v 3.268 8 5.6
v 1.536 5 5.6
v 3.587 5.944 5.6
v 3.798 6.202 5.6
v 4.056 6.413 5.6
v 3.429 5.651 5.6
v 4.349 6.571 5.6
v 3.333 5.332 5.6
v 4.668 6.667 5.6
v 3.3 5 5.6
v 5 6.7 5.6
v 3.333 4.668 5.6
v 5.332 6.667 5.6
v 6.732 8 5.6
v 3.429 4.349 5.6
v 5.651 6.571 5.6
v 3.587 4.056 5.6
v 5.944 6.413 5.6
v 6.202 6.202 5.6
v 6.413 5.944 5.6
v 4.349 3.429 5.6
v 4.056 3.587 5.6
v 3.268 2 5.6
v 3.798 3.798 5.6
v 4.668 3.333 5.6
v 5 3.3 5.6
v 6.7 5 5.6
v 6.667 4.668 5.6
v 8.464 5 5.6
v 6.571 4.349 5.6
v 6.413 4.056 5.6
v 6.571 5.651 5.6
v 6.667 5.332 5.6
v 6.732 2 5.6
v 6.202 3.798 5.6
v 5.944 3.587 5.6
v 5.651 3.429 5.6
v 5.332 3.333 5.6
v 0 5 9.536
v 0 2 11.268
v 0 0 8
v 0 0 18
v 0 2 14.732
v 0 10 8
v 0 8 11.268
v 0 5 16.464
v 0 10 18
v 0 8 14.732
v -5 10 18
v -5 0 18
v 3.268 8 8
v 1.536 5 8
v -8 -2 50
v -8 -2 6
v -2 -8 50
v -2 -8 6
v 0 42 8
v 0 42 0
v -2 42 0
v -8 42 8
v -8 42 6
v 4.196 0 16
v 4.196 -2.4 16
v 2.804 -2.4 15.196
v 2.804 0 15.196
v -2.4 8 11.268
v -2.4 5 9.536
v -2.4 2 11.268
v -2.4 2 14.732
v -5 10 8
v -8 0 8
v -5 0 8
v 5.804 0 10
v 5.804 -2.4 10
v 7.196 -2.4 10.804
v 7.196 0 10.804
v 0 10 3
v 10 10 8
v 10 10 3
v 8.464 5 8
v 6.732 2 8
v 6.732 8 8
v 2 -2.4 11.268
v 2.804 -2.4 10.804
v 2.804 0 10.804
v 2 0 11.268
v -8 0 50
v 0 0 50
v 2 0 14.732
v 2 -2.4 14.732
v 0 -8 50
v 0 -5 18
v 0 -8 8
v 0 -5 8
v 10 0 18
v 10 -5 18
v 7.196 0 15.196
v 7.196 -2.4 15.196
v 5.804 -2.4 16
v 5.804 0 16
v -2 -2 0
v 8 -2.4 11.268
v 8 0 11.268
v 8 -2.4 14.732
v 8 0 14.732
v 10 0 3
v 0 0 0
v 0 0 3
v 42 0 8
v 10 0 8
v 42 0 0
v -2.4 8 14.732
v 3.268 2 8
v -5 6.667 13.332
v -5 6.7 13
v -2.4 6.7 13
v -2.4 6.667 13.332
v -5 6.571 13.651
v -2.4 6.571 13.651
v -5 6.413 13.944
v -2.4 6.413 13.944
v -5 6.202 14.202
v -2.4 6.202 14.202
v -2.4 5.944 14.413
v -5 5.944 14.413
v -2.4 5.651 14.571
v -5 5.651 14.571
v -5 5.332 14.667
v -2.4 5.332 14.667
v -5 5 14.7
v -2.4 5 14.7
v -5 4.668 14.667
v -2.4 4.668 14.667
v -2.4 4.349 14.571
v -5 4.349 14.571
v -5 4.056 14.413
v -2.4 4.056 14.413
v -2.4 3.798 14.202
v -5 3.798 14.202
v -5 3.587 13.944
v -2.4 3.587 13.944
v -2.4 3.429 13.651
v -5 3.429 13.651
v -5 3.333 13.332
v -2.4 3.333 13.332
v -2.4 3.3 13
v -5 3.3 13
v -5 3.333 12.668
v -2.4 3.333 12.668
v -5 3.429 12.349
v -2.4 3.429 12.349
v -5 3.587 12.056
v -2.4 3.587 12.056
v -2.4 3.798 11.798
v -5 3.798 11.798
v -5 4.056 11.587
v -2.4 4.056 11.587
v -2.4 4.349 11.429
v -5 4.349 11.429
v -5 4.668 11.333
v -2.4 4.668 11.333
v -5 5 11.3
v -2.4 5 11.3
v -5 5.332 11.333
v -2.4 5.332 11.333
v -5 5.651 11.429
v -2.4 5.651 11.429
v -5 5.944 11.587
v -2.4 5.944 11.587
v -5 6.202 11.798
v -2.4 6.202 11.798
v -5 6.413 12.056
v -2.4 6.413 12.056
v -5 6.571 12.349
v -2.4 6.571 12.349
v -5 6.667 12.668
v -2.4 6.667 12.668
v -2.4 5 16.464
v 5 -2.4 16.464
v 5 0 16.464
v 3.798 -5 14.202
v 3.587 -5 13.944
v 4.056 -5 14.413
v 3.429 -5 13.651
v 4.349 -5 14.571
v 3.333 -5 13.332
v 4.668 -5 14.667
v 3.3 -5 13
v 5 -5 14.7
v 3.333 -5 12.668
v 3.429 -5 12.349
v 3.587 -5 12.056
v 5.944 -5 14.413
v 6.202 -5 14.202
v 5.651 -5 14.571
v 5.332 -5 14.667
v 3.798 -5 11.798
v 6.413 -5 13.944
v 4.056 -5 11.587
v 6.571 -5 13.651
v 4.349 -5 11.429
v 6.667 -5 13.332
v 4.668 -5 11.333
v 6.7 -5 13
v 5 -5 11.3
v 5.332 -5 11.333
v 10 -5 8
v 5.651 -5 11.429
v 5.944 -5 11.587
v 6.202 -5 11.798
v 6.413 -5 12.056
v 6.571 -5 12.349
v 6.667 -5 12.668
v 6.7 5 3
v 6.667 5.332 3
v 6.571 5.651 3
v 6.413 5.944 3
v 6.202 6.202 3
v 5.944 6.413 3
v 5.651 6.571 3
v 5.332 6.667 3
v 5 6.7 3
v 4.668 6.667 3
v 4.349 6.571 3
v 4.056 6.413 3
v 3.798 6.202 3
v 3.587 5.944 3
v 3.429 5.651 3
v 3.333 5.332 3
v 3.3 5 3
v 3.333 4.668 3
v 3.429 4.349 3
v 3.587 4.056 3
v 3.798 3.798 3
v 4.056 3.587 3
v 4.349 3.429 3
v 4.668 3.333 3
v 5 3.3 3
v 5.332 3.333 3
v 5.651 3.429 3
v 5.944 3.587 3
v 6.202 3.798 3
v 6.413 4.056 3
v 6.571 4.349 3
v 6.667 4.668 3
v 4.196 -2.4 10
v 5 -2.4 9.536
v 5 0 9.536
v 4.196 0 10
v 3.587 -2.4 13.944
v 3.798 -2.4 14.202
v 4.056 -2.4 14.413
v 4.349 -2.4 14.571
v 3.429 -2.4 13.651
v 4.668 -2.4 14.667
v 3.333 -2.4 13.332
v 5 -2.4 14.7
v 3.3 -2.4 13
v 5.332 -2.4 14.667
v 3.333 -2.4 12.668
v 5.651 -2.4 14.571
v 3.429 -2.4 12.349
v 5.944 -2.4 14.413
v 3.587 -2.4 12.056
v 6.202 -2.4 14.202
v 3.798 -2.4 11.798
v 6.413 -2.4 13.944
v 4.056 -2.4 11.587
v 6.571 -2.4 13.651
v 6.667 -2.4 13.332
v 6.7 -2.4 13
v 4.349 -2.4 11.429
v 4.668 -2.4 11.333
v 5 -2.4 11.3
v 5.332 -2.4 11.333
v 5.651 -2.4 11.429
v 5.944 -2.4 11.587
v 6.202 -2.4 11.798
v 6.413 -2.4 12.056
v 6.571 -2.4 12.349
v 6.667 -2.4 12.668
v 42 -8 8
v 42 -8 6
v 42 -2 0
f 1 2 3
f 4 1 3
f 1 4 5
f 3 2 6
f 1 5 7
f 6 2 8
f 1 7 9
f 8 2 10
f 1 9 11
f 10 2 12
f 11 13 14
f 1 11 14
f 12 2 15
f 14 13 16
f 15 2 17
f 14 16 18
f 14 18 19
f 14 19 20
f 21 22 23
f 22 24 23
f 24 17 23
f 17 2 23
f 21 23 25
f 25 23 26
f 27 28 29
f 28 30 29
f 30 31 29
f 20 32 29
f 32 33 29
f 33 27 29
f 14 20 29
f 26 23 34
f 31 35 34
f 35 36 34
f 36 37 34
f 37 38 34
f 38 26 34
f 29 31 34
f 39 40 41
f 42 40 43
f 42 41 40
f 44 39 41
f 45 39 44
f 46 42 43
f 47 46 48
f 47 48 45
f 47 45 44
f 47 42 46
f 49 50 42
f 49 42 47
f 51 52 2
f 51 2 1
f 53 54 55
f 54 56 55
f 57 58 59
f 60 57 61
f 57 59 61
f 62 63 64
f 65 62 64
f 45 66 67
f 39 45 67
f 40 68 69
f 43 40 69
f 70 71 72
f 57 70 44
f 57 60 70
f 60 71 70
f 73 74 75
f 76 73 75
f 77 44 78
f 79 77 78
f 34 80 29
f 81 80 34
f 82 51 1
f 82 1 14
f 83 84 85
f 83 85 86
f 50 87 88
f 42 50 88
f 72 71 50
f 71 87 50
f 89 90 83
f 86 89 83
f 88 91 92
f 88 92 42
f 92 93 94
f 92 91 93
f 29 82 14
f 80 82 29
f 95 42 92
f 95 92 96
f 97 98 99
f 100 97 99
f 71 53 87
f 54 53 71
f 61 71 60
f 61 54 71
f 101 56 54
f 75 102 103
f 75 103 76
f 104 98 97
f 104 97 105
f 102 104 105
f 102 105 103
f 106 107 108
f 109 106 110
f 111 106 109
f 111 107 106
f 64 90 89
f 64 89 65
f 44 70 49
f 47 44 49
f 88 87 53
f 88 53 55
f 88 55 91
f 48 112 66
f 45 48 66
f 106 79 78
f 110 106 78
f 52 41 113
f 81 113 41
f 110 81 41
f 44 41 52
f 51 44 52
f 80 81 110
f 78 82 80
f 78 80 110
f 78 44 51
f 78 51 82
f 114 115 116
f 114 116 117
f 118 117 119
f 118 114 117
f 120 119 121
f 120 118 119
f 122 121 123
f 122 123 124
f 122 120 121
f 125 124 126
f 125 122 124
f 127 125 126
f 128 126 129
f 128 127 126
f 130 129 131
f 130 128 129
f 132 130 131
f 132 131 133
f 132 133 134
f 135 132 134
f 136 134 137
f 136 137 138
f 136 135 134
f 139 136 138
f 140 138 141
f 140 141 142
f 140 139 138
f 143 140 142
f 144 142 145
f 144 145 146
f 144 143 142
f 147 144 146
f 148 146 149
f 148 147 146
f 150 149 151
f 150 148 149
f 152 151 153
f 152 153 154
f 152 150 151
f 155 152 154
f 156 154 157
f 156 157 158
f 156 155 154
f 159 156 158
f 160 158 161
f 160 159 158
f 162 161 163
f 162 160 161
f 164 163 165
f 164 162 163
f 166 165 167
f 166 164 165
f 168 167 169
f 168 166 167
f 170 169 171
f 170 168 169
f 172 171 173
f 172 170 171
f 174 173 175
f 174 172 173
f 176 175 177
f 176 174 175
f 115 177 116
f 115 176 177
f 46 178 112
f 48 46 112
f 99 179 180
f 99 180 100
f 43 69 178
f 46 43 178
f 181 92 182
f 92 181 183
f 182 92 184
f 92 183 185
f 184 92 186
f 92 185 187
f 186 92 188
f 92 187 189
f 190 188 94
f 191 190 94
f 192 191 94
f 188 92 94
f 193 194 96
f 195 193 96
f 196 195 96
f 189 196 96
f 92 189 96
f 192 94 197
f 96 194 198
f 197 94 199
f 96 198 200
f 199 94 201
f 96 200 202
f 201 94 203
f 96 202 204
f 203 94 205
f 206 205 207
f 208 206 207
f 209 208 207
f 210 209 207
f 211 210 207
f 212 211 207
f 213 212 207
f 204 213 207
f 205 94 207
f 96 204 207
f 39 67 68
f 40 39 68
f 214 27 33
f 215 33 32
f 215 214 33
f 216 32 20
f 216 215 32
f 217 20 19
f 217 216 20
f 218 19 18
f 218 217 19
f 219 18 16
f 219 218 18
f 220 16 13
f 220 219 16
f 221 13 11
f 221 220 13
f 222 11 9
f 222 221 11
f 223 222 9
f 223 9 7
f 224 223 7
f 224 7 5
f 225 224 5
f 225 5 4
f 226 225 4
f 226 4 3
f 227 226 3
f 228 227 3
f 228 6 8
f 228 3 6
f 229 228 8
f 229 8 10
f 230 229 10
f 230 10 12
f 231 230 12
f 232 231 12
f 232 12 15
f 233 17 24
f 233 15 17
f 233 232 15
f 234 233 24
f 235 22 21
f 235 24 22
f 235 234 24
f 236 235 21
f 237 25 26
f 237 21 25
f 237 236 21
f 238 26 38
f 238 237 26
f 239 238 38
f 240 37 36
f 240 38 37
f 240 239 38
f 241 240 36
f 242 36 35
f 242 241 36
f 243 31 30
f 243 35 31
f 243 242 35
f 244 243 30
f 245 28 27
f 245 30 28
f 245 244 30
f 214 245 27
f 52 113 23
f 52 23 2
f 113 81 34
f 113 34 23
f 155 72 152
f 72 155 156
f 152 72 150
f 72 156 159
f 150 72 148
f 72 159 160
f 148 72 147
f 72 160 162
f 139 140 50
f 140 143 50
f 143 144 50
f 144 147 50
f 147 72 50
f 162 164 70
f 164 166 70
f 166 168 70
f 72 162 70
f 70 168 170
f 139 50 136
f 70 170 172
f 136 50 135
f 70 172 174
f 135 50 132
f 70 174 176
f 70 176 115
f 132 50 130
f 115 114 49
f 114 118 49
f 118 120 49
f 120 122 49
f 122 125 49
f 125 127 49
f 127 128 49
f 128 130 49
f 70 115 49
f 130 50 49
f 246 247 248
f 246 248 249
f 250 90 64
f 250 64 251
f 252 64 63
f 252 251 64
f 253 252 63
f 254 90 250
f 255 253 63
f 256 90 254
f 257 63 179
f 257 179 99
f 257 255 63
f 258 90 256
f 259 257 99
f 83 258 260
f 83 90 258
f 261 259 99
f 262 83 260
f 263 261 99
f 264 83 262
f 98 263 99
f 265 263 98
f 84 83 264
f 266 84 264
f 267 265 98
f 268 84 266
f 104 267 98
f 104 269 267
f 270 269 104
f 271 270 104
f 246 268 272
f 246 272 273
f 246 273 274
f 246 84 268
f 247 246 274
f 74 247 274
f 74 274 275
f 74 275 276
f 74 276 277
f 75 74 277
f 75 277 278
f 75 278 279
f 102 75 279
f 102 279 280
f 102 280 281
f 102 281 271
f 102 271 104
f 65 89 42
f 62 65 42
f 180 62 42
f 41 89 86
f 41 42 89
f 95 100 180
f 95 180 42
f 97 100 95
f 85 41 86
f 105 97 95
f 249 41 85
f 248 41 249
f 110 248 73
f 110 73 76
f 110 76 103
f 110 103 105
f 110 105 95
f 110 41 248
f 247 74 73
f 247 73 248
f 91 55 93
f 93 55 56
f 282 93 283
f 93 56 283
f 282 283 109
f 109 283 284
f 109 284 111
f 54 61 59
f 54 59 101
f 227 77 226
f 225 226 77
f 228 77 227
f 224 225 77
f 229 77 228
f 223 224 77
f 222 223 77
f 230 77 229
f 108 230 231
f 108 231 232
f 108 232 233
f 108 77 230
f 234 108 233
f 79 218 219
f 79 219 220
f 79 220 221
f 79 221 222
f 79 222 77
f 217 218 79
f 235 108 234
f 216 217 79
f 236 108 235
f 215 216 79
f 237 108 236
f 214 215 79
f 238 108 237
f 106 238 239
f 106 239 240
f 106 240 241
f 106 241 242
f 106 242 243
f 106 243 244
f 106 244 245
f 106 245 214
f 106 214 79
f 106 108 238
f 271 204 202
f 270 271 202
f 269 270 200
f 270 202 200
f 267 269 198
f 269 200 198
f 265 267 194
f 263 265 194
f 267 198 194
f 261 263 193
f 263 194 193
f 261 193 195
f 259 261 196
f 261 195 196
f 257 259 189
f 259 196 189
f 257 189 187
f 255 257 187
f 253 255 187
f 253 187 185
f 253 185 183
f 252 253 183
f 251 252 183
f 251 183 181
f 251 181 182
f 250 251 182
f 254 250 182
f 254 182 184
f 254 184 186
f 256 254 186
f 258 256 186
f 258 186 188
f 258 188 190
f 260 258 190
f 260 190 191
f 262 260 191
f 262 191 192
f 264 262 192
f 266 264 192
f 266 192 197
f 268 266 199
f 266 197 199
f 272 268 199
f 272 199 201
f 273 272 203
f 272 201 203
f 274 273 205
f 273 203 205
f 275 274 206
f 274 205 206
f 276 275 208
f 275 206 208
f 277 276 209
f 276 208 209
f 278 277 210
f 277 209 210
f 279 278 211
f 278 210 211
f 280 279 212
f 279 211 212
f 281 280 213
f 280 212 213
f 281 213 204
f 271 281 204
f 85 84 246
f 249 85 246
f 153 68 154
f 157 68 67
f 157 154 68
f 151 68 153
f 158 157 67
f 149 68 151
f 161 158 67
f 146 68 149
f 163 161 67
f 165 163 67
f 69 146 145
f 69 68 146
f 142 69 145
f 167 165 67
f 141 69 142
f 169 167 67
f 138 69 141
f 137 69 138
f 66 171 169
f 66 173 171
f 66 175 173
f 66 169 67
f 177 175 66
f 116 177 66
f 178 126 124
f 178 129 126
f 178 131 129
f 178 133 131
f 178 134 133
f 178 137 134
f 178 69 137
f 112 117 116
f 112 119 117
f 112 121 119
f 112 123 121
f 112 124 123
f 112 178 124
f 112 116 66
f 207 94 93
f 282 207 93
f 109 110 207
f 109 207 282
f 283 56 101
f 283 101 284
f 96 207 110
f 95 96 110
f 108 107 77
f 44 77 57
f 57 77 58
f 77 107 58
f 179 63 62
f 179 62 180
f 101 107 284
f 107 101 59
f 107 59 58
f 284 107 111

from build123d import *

# Parameters (mm, degrees)
BOSS_EXTRUDE1_DEPTH     = 8
SKETCH2_W               = 8
SKETCH2_H               = 8
BOSS_EXTRUDE2_DEPTH     = 42
SKETCH3_W               = 10
SKETCH3_H               = 5
BOSS_EXTRUDE3_DEPTH     = 10
CUT_EXTRUDE1_REACH      = 82.455
SKETCH4_R               = 1.7
CUT_EXTRUDE2_DEPTH      = 2.4
CHAMFER1_SIZE           = 6
MIRROR2_COPY_1_SKETCH_W = 10
MIRROR2_COPY_1_SKETCH_H = 5
MIRROR2_COPY_1_DEPTH    = 10
MIRROR2_COPY_2_REACH    = 82.455
MIRROR2_COPY_2_SKETCH_R = 1.7
MIRROR2_COPY_3_DEPTH    = 2.4
MIRROR2_COPY_4_SKETCH_W = 10
MIRROR2_COPY_4_SKETCH_H = 5
MIRROR2_COPY_4_DEPTH    = 10
MIRROR2_COPY_5_REACH    = 82.455
MIRROR2_COPY_5_SKETCH_R = 1.7
MIRROR2_COPY_6_DEPTH    = 2.4


with BuildPart() as part:
    # Sketch1 → Boss-Extrude1 (new body)
    with BuildSketch(Plane.XY):
        Polygon((0, 0), (0, 42), (-8, 42), (-8, -8), (42, -8), (42, 0), align=None)
    extrude(amount=BOSS_EXTRUDE1_DEPTH)

    # Sketch2 → Boss-Extrude2 (add)
    with BuildSketch(Plane.XY.offset(8)):
        with Locations((-4, -4)):
            Rectangle(SKETCH2_W, SKETCH2_H)
    extrude(amount=BOSS_EXTRUDE2_DEPTH)

    # Sketch3 → Boss-Extrude3 (add)
    with BuildSketch(Plane.XY.offset(8)):
        with Locations((5, -2.5)):
            Rectangle(SKETCH3_W, SKETCH3_H)
    boss_extrude3 = extrude(amount=BOSS_EXTRUDE3_DEPTH)

    # Sketch4 → Cut-Extrude1 (cut, up to next)
    with BuildSketch(Plane.XZ.offset(5), mode=Mode.PRIVATE) as cut_extrude1_sk1:
        with Locations((5, 13)):
            Circle(SKETCH4_R)
    cut_extrude1_tool1 = extrude(cut_extrude1_sk1.sketch, amount=-CUT_EXTRUDE1_REACH, mode=Mode.PRIVATE) & part.part
    cut_extrude1 = cut_extrude1_tool1.solids().sort_by_distance((5, -5, 13))[0]
    add(cut_extrude1, mode=Mode.SUBTRACT)

    # Sketch5 → Cut-Extrude2 (cut)
    with BuildSketch(Plane(origin=(0, 0, 0), x_dir=(1, 0, 0), z_dir=(0, 1, 0))):
        Polygon((8.464101615, -13), (6.732050808, -10), (3.267949192, -10), (1.535898385, -13), (3.267949192, -16), (6.732050808, -16), align=None)
    cut_extrude2 = extrude(amount=-CUT_EXTRUDE2_DEPTH, mode=Mode.SUBTRACT)

    # Mirror1: Boss-Extrude3, Cut-Extrude1, Cut-Extrude2 across plane
    add(boss_extrude3.mirror(Plane(origin=(0, -4, 4), x_dir=(0, 0.7071067811865489, 0.7071067811865462), z_dir=(0, 0.7071067811865464, -0.7071067811865488))))
    add(cut_extrude1.mirror(Plane(origin=(0, -4, 4), x_dir=(0, 0.7071067811865489, 0.7071067811865462), z_dir=(0, 0.7071067811865464, -0.7071067811865488))), mode=Mode.SUBTRACT)
    add(cut_extrude2.mirror(Plane(origin=(0, -4, 4), x_dir=(0, 0.7071067811865489, 0.7071067811865462), z_dir=(0, 0.7071067811865464, -0.7071067811865488))), mode=Mode.SUBTRACT)

    # Chamfer1
    chamfer1_edges = [part.edges().sort_by_distance(p)[0] for p in [
        (-8, 17, 0),
        (-8, -8, 25),
        (17, -8, 0),
    ]]
    chamfer(chamfer1_edges, length=CHAMFER1_SIZE)

    # Mirror2 copy 1 sketch → Mirror2 copy 1 (add)
    with BuildSketch(Plane(origin=(0, 0, 8), x_dir=(0, 0, 1), z_dir=(0, 1, 0))):
        with Locations((5, -2.5)):
            Rectangle(MIRROR2_COPY_1_SKETCH_W, MIRROR2_COPY_1_SKETCH_H)
    extrude(amount=MIRROR2_COPY_1_DEPTH)

    # Mirror2 copy 2 sketch → Mirror2 copy 2 (cut, up to next)
    with BuildSketch(Plane(origin=(-5, -8, 8), x_dir=(0, 0, 1), z_dir=(-1, 0, 0)), mode=Mode.PRIVATE) as mirror2_copy_2_sk1:
        with Locations((5, 13)):
            Circle(MIRROR2_COPY_2_SKETCH_R)
    mirror2_copy_2_tool1 = extrude(mirror2_copy_2_sk1.sketch, amount=-MIRROR2_COPY_2_REACH, mode=Mode.PRIVATE) & part.part
    add(mirror2_copy_2_tool1.solids().sort_by_distance((-5, 5, 13))[0], mode=Mode.SUBTRACT)

    # Mirror2 copy 3 sketch → Mirror2 copy 3 (cut)
    with BuildSketch(Plane(origin=(0, -8, 8), x_dir=(0, 0, 1), z_dir=(1, 0, 0))):
        Polygon((8.464101615, -13), (6.732050808, -10), (3.267949192, -10), (1.535898385, -13), (3.267949192, -16), (6.732050808, -16), align=None)
    extrude(amount=-MIRROR2_COPY_3_DEPTH, mode=Mode.SUBTRACT)

    # Mirror2 copy 4 sketch → Mirror2 copy 4 (add)
    with BuildSketch(Plane(origin=(0, 0, 8), x_dir=(0, 0, 1), z_dir=(1, 0, 0))):
        with Locations((5, 2.5)):
            Rectangle(MIRROR2_COPY_4_SKETCH_W, MIRROR2_COPY_4_SKETCH_H)
    extrude(amount=MIRROR2_COPY_4_DEPTH)

    # Mirror2 copy 5 sketch → Mirror2 copy 5 (cut, up to next)
    with BuildSketch(Plane(origin=(-8, -5, 8), x_dir=(0, 0, 1), z_dir=(0, -1, 0)), mode=Mode.PRIVATE) as mirror2_copy_5_sk1:
        with Locations((5, -13)):
            Circle(MIRROR2_COPY_5_SKETCH_R)
    mirror2_copy_5_tool1 = extrude(mirror2_copy_5_sk1.sketch, amount=-MIRROR2_COPY_5_REACH, mode=Mode.PRIVATE) & part.part
    add(mirror2_copy_5_tool1.solids().sort_by_distance((5, -5, 13))[0], mode=Mode.SUBTRACT)

    # Mirror2 copy 6 sketch → Mirror2 copy 6 (cut)
    with BuildSketch(Plane(origin=(-8, 0, 8), x_dir=(0, 0, 1), z_dir=(0, 1, 0))):
        Polygon((8.464101615, 13), (6.732050808, 10), (3.267949192, 10), (1.535898385, 13), (3.267949192, 16), (6.732050808, 16), align=None)
    extrude(amount=-MIRROR2_COPY_6_DEPTH, mode=Mode.SUBTRACT)


solid = part.part
